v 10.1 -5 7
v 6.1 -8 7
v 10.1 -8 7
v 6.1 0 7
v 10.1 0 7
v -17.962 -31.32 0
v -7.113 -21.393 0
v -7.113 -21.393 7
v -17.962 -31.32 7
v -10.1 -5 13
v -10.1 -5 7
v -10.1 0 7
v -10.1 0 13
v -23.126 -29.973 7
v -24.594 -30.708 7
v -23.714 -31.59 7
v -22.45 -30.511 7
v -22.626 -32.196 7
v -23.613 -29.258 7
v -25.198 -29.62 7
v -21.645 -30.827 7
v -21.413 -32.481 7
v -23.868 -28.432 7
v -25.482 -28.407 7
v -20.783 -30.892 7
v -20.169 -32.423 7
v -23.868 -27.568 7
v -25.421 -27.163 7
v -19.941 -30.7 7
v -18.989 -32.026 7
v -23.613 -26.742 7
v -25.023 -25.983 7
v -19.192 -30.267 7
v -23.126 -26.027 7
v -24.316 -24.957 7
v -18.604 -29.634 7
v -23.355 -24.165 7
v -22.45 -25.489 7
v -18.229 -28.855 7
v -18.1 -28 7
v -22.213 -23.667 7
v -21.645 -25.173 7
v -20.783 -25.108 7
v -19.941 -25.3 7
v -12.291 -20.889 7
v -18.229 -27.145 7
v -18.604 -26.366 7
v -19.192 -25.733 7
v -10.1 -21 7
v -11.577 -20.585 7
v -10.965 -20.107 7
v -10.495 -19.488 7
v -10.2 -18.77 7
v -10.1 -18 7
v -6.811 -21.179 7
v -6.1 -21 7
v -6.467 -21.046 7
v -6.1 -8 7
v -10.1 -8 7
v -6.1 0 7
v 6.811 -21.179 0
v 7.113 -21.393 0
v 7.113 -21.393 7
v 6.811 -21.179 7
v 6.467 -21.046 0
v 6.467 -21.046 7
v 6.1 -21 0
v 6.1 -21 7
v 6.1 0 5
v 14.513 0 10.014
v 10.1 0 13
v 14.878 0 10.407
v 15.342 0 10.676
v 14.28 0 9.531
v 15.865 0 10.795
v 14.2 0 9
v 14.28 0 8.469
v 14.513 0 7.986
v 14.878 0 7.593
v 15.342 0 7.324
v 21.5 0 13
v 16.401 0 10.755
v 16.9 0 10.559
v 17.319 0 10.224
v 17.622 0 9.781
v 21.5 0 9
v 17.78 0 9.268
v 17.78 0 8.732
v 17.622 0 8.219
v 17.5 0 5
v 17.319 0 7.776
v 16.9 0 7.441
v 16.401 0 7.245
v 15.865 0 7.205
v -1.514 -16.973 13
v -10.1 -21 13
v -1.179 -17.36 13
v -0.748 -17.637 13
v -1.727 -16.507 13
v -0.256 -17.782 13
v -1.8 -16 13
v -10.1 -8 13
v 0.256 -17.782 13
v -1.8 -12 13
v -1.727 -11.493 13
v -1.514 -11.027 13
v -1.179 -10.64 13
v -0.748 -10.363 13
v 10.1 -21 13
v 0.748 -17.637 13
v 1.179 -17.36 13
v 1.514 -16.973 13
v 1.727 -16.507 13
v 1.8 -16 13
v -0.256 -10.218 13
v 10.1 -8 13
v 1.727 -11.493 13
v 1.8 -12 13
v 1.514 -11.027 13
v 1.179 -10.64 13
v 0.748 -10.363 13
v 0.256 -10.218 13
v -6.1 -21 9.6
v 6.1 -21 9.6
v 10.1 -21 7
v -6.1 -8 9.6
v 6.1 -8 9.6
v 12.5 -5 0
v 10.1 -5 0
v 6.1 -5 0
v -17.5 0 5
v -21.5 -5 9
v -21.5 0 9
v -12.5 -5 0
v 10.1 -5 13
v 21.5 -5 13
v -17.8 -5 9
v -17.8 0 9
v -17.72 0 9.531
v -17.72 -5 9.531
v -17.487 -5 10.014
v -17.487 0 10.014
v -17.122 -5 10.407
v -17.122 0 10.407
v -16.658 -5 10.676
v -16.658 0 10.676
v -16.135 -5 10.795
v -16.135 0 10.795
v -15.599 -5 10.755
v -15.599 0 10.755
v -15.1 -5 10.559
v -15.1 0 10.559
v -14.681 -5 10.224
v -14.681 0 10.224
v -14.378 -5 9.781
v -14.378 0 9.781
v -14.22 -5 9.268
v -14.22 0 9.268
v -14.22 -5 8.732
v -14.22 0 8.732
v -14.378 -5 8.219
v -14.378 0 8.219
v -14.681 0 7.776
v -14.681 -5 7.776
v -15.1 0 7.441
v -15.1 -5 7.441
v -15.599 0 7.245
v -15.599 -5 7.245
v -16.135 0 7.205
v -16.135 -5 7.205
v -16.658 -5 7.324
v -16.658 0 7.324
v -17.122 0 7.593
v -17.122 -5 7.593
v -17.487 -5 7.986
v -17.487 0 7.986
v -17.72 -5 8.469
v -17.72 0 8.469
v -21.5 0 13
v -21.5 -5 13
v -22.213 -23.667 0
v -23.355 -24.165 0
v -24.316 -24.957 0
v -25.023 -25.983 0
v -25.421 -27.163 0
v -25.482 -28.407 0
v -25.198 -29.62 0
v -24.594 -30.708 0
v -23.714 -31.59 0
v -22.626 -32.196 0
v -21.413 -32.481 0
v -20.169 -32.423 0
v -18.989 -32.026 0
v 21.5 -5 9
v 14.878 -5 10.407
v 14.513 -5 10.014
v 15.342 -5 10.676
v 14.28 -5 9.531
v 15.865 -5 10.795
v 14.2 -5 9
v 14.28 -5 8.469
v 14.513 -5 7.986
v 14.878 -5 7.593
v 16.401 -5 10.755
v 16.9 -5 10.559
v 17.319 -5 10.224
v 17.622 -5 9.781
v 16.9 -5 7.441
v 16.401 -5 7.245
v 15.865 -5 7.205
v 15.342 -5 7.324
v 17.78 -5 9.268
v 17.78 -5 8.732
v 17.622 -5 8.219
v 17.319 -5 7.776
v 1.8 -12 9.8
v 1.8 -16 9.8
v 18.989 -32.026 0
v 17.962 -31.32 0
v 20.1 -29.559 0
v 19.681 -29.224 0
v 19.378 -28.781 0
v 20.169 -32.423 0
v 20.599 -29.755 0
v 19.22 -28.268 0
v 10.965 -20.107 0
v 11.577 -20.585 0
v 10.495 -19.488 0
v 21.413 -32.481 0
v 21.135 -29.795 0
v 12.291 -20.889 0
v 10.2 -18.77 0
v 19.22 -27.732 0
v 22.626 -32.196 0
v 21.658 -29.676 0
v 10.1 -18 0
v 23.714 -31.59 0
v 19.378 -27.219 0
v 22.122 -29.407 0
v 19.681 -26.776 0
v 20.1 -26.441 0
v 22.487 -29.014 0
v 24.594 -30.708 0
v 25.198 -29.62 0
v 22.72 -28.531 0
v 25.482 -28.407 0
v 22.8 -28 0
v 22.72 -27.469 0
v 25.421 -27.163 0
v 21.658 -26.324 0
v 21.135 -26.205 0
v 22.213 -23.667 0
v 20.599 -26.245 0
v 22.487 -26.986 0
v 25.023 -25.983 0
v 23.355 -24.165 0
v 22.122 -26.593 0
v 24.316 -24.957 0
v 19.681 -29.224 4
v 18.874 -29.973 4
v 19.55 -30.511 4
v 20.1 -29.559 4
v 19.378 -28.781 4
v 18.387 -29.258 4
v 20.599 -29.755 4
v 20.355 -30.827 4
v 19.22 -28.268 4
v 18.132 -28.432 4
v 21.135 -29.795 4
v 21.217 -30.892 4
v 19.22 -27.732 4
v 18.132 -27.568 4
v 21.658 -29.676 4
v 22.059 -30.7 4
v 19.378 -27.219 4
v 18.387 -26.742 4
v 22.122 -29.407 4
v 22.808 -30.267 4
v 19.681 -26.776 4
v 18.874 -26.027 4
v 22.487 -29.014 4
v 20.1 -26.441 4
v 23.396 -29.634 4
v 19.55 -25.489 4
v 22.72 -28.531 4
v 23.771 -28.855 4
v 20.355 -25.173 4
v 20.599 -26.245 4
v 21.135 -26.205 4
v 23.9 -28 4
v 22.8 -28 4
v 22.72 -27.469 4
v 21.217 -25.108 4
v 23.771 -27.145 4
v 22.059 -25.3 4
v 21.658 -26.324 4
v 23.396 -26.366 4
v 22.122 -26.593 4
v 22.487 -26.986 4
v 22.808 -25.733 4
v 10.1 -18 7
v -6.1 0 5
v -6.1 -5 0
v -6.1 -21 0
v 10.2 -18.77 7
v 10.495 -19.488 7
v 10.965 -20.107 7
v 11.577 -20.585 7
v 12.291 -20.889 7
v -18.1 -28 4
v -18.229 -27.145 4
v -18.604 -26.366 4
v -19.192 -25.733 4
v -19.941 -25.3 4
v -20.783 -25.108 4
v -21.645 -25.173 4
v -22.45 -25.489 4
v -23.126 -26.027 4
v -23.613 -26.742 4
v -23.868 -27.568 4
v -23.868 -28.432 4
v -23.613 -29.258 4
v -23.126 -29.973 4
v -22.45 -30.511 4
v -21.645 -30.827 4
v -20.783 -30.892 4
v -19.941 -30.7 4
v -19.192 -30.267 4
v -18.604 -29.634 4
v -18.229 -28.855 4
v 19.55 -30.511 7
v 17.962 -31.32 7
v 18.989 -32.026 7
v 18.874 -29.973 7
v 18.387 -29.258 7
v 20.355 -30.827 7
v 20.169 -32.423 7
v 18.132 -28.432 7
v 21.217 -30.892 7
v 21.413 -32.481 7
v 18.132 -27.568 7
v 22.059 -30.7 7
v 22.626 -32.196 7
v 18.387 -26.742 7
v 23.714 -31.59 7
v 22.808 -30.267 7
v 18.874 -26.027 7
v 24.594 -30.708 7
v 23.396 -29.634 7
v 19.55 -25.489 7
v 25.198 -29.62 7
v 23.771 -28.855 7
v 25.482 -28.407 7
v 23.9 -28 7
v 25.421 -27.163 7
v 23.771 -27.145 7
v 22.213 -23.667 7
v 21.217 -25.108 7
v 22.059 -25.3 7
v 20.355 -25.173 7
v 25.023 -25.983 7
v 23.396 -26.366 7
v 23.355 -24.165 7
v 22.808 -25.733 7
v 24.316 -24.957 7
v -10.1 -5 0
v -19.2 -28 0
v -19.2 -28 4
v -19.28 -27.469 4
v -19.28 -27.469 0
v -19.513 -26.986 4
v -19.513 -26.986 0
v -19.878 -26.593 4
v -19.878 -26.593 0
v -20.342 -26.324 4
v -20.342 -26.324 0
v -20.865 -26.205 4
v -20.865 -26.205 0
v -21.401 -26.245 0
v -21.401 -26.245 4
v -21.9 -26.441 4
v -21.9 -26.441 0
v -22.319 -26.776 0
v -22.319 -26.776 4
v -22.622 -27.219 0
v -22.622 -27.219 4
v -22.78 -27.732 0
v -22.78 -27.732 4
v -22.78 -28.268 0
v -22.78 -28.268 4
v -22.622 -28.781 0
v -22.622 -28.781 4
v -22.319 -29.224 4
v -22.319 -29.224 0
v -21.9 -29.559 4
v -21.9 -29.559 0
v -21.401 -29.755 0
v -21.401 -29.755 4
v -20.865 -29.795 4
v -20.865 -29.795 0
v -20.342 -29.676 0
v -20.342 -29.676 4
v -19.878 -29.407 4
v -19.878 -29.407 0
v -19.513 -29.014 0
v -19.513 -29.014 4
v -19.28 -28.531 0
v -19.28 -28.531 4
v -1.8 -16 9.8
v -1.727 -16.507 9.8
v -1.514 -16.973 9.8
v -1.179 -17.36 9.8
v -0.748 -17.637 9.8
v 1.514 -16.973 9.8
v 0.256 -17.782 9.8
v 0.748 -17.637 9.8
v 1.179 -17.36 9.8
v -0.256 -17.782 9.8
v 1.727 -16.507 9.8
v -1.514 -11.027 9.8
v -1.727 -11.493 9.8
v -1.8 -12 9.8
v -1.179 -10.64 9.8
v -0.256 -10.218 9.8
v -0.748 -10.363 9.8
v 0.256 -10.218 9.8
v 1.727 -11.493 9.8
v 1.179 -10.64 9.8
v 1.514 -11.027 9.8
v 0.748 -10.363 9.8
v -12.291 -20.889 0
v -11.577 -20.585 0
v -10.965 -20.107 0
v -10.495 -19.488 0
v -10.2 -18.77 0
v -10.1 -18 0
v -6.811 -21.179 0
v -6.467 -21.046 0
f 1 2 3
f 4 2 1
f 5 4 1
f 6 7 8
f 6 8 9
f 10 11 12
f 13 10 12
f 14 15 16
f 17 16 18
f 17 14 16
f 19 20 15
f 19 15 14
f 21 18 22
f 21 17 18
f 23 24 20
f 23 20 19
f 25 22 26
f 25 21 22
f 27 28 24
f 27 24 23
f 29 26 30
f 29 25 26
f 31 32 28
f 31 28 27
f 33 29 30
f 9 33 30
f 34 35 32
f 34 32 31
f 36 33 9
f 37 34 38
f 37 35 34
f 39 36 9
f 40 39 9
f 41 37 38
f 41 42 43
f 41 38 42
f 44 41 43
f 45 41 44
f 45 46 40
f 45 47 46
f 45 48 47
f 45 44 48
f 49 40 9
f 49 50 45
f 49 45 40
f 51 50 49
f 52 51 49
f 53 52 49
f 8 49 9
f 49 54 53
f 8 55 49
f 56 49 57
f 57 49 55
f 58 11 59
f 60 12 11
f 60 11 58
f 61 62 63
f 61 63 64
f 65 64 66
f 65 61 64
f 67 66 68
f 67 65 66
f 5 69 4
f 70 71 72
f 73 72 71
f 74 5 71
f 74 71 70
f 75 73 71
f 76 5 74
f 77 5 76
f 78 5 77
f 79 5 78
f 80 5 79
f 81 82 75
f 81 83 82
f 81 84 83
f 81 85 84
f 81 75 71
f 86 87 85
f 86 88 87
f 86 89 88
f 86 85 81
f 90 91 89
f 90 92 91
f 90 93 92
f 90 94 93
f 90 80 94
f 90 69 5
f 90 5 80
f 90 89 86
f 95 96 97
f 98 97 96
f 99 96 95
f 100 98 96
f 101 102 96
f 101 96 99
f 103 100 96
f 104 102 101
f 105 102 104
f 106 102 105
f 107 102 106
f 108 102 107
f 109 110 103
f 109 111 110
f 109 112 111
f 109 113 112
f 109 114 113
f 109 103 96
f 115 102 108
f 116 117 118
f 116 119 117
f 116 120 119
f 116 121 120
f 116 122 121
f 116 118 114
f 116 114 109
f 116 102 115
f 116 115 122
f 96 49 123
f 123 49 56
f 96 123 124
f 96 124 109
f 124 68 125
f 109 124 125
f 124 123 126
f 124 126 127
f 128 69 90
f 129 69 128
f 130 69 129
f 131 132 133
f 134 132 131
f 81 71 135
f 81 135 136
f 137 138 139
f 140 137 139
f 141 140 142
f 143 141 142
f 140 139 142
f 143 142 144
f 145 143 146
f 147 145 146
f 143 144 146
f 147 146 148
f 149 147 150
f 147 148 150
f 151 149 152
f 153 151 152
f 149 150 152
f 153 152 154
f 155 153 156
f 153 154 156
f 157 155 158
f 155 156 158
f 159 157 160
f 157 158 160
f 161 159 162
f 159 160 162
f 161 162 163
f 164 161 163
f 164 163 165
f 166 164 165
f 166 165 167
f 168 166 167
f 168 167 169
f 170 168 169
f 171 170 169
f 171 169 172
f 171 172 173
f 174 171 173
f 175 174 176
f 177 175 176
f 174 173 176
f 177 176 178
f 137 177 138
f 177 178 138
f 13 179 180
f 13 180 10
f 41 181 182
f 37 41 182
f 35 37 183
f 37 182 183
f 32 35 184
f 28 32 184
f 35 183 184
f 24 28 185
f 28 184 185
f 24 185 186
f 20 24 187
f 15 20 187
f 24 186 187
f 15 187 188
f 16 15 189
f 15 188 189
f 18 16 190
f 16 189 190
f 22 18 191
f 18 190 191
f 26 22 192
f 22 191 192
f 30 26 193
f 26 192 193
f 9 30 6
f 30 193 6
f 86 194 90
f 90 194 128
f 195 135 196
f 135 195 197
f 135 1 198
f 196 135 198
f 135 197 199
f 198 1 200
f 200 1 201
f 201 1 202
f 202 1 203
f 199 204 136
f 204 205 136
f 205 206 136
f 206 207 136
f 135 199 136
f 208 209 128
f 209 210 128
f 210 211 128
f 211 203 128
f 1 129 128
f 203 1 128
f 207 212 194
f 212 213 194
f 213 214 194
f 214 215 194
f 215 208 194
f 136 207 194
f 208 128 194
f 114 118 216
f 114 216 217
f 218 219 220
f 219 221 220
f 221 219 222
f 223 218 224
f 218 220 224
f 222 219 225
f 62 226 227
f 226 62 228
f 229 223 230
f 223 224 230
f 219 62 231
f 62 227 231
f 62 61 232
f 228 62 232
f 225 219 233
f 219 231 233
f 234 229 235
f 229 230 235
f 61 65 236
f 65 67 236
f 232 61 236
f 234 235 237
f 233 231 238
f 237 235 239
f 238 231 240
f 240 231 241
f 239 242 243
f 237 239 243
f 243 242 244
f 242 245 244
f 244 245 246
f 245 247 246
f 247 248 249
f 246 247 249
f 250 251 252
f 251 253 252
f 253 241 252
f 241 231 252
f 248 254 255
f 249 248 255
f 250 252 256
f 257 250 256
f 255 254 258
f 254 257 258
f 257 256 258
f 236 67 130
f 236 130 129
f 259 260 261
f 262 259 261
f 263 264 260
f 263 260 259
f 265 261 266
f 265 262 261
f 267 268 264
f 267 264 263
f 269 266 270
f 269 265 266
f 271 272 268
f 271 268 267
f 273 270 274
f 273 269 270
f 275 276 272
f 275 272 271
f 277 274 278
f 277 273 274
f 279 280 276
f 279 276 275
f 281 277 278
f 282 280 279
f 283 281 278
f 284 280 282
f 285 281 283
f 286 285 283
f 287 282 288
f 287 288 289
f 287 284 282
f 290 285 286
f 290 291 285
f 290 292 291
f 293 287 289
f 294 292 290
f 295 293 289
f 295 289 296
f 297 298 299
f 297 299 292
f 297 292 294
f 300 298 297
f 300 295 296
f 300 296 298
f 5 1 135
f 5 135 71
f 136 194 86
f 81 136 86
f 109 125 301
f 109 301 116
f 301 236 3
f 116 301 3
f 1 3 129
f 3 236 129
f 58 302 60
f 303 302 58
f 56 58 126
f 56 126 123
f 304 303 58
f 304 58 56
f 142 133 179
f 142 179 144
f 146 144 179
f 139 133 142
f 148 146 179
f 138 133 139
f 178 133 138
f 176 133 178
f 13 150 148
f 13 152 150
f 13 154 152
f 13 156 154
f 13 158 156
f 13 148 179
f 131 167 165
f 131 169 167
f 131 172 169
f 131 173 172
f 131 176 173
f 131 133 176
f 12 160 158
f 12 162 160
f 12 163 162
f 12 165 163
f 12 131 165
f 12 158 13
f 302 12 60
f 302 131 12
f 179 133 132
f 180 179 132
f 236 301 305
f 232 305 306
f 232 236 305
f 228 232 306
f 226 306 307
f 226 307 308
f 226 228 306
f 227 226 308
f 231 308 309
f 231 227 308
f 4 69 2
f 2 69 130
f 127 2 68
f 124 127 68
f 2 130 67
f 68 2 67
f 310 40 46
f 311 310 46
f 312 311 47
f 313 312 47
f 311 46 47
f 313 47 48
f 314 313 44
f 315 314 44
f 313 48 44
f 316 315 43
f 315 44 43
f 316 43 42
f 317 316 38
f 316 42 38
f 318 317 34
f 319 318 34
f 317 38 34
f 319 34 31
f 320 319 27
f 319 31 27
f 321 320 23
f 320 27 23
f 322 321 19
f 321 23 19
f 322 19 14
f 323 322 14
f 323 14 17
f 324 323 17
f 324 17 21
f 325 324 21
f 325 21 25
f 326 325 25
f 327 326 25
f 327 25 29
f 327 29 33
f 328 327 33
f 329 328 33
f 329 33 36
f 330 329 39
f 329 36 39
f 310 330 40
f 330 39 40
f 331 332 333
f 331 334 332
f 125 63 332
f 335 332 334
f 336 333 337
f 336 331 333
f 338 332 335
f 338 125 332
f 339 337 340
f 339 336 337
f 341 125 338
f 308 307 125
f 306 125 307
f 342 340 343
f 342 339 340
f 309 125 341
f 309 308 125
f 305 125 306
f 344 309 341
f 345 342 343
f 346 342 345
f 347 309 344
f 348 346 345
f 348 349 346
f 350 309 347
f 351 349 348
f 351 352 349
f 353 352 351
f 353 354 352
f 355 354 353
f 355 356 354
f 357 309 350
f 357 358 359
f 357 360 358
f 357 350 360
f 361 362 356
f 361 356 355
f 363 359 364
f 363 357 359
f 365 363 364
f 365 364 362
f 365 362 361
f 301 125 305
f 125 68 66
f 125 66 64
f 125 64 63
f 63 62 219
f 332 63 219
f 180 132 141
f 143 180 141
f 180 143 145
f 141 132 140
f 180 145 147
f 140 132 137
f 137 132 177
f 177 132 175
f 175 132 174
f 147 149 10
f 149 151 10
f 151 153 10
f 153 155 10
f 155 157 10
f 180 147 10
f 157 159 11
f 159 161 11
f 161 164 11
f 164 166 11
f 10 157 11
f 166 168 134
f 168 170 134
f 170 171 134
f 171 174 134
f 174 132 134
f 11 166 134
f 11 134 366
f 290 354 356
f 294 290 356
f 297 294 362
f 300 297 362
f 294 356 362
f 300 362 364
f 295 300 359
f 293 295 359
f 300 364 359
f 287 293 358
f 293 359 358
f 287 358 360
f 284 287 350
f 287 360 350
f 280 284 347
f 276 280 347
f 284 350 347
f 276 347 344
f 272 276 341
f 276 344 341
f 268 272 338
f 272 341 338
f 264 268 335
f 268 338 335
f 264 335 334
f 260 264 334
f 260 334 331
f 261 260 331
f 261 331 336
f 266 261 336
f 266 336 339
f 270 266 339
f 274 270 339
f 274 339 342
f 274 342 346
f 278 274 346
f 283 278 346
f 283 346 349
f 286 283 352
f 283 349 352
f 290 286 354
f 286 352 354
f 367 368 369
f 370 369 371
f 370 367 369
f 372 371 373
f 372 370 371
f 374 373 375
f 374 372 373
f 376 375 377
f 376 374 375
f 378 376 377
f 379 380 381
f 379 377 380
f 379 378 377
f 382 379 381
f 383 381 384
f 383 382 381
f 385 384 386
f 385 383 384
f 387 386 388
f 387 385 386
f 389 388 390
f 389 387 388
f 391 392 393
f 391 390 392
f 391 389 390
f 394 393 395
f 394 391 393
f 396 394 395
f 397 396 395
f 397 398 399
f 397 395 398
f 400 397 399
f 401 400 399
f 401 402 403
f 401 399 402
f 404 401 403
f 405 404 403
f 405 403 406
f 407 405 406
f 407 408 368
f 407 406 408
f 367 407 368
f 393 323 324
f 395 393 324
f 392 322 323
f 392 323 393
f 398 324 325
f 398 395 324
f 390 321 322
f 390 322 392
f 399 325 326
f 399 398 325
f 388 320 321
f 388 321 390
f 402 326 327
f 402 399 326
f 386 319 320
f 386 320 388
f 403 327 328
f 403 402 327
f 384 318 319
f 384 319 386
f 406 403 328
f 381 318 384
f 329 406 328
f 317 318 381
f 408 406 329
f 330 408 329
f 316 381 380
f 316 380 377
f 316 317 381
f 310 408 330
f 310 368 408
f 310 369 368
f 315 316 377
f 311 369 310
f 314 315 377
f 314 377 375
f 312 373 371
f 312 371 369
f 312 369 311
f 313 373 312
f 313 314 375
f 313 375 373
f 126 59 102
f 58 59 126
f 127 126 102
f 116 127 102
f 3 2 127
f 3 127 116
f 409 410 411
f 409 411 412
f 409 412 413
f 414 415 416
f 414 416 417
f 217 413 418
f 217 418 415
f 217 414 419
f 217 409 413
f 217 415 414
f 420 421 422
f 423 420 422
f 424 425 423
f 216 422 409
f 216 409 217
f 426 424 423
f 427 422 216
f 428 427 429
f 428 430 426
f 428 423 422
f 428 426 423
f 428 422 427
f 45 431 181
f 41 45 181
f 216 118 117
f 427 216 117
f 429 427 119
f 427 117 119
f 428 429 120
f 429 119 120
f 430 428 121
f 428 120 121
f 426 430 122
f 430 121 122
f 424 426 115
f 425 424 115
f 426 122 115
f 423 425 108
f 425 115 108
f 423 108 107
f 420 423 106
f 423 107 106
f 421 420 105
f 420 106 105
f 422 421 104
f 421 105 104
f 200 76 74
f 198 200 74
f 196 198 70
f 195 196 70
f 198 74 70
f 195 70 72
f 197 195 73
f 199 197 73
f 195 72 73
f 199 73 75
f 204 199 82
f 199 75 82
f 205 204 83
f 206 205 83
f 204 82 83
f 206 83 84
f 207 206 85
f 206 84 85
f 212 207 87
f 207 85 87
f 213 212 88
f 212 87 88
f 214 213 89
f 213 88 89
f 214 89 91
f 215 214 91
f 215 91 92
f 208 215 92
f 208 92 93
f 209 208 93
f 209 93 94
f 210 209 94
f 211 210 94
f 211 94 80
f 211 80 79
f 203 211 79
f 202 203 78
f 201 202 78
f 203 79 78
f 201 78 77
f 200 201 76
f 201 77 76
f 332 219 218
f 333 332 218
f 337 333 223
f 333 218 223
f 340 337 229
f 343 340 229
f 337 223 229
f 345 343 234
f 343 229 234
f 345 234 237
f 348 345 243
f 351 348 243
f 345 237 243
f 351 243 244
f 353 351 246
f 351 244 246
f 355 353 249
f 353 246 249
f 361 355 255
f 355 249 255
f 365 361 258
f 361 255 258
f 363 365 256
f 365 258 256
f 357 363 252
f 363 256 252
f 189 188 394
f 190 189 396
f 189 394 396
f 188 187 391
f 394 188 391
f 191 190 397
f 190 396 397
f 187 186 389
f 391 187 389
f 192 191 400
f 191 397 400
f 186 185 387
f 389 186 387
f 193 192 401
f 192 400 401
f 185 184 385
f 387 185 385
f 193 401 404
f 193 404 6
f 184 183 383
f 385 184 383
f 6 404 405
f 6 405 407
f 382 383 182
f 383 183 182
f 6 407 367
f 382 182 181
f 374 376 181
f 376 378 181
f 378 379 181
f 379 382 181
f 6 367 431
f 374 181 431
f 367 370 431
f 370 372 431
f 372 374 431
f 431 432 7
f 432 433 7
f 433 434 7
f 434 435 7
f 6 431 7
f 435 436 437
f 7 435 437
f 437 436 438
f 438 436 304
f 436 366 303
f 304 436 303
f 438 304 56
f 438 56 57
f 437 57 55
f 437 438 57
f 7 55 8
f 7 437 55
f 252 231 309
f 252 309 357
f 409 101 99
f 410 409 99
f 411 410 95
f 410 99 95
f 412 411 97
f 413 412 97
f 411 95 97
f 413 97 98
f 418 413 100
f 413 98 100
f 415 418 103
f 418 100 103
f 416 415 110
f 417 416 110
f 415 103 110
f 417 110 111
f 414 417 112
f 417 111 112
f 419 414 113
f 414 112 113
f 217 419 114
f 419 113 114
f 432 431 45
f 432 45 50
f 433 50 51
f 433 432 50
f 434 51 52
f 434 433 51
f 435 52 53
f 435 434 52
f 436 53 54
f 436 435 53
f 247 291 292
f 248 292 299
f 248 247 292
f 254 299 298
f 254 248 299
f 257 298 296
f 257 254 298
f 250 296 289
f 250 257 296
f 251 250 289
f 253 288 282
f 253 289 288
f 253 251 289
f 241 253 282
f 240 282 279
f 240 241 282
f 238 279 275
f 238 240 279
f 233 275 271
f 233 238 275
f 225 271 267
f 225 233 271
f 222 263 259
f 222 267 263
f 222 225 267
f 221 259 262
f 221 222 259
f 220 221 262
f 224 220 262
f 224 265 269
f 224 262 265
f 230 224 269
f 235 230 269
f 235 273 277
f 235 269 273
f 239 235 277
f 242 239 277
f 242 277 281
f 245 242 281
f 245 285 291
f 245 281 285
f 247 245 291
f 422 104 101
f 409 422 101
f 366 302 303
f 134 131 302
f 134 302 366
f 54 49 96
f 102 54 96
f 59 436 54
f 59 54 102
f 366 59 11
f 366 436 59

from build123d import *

# Parameters (mm, degrees)
SKETCH_R        = 1.8
PAD_DEPTH       = 7
SKETCH001_R     = 2.9
POCKET_DEPTH    = 3
SKETCH002_W     = 11.4
SKETCH002_H     = 5
PAD001_DEPTH    = 6
SKETCH005_R     = 1.8
POCKET002_DEPTH = 5
SKETCH003_W     = 20.2
SKETCH003_H     = 13
PAD002_DEPTH    = 6
SKETCH009_W     = 12.2
SKETCH009_H     = 13
POCKET006_DEPTH = 9.6
POCKET003_DEPTH = 47.001
POCKET004_DEPTH = 5
POCKET005_DEPTH = 3.2


with BuildPart() as part:
    # Sketch → Pad (new body)
    with BuildSketch(Plane.XY):
        with BuildLine():
            Line((-21.5, 0), (-21.5, -5))
            Line((-21.5, -5), (-10.1, -5))
            Line((-10.1, -5), (-10.1, -18))
            ThreePointArc((-12.291233, -20.888926), (-10.70978, -19.812967), (-10.1, -18))
            Line((-12.291233, -20.888926), (-22.213151, -23.666611))
            ThreePointArc((-22.213151, -23.666611), (-24.933961, -30.184937), (-17.962388, -31.320077))
            Line((-7.112537, -21.393308), (-17.962388, -31.320077))
            ThreePointArc((-6.1, -21), (-6.643121, -21.10178), (-7.112537, -21.393308))
            Line((-6.1, -21), (6.1, -21))
            ThreePointArc((7.112537, -21.393308), (6.643121, -21.10178), (6.1, -21))
            Line((7.112537, -21.393308), (17.962388, -31.320077))
            ThreePointArc((17.962388, -31.320077), (24.933961, -30.184937), (22.213151, -23.666611))
            Line((12.291233, -20.888926), (22.213151, -23.666611))
            ThreePointArc((10.1, -18), (10.70978, -19.812967), (12.291233, -20.888926))
            Line((10.1, -5), (10.1, -18))
            Line((21.5, -5), (10.1, -5))
            Line((21.5, -5), (21.5, 0))
            Line((21.5, 0), (6.1, 0))
            Line((6.1, 0), (6.1, -8))
            Line((-6.1, -8), (6.1, -8))
            Line((-6.1, 0), (-6.1, -8))
            Line((-21.5, 0), (-6.1, 0))
        make_face()
        with Locations((-21, -28)):
            Circle(SKETCH_R, mode=Mode.SUBTRACT)
        with Locations((21, -28)):
            Circle(SKETCH_R, mode=Mode.SUBTRACT)
    extrude(amount=PAD_DEPTH)

    # Sketch001 (on Face26 of Pad) → Pocket (cut)
    with BuildSketch(Plane.XY.offset(7)):
        with Locations((-21, -28)):
            Circle(SKETCH001_R)
        with Locations((21, -28)):
            Circle(SKETCH001_R)
    extrude(amount=-POCKET_DEPTH, mode=Mode.SUBTRACT)

    # Sketch002 (on Face5 of Pocket) → Pad001 (join)
    with BuildSketch(Plane.XY.offset(7)):
        with Locations((15.8, -2.5)):
            Rectangle(SKETCH002_W, SKETCH002_H)
        with Locations((-15.8, -2.5)):
            Rectangle(SKETCH002_W, SKETCH002_H)
    extrude(amount=PAD001_DEPTH)

    # Sketch005 (on Face30 of Pad001) → Pocket002 (cut)
    with BuildSketch(Plane(origin=(0, 0, 0), x_dir=(-1, 0, 0), z_dir=(0, 1, 0))):
        with Locations((-16, 9)):
            Circle(SKETCH005_R)
        with Locations((16, 9)):
            Circle(SKETCH005_R)
    extrude(amount=-POCKET002_DEPTH, mode=Mode.SUBTRACT)

    # Sketch003 (on Face3 of Pad001) → Pad002 (join)
    with BuildSketch(Plane.XY.offset(7)):
        with Locations((0, -14.5)):
            Rectangle(SKETCH003_W, SKETCH003_H)
    extrude(amount=PAD002_DEPTH)

    # Sketch009 (on Face1 of Pad002) → Pocket006 (cut)
    with BuildSketch(Plane(origin=(0, 0, 0), x_dir=(1, 0, 0), z_dir=(0, 0, -1))):
        with Locations((0, 14.5)):
            Rectangle(SKETCH009_W, SKETCH009_H)
    extrude(amount=-POCKET006_DEPTH, mode=Mode.SUBTRACT)

    # Sketch006 → Pocket003 (cut, through all)
    with BuildSketch(Plane(origin=(-21.5, 0, 0), x_dir=(0, -1, 0), z_dir=(-1, 0, 0))):
        Polygon((5, 0), (0, 0), (0, 5), align=None)
    extrude(amount=-POCKET003_DEPTH, mode=Mode.SUBTRACT)

    # Sketch007 (on Face29 of Pocket003) → Pocket004 (cut)
    with BuildSketch(Plane.XZ.offset(5)):
        Polygon((-21.5, 0), (-21.5, 9), (-12.5, 0), align=None)
        Polygon((21.5, 0), (21.5, 9), (12.5, 0), align=None)
    extrude(amount=-POCKET004_DEPTH, mode=Mode.SUBTRACT)

    # Sketch008 (on Face18 of Pocket004) → Pocket005 (cut)
    with BuildSketch(Plane.XY.offset(13)):
        with BuildLine():
            ThreePointArc((1.8, -12), (0, -10.2), (-1.8, -12))
            Line((-1.8, -12), (-1.8, -16))
            ThreePointArc((-1.8, -16), (0, -17.8), (1.8, -16))
            Line((1.8, -12), (1.8, -16))
        make_face()
    extrude(amount=-POCKET005_DEPTH, mode=Mode.SUBTRACT)


solid = part.part
